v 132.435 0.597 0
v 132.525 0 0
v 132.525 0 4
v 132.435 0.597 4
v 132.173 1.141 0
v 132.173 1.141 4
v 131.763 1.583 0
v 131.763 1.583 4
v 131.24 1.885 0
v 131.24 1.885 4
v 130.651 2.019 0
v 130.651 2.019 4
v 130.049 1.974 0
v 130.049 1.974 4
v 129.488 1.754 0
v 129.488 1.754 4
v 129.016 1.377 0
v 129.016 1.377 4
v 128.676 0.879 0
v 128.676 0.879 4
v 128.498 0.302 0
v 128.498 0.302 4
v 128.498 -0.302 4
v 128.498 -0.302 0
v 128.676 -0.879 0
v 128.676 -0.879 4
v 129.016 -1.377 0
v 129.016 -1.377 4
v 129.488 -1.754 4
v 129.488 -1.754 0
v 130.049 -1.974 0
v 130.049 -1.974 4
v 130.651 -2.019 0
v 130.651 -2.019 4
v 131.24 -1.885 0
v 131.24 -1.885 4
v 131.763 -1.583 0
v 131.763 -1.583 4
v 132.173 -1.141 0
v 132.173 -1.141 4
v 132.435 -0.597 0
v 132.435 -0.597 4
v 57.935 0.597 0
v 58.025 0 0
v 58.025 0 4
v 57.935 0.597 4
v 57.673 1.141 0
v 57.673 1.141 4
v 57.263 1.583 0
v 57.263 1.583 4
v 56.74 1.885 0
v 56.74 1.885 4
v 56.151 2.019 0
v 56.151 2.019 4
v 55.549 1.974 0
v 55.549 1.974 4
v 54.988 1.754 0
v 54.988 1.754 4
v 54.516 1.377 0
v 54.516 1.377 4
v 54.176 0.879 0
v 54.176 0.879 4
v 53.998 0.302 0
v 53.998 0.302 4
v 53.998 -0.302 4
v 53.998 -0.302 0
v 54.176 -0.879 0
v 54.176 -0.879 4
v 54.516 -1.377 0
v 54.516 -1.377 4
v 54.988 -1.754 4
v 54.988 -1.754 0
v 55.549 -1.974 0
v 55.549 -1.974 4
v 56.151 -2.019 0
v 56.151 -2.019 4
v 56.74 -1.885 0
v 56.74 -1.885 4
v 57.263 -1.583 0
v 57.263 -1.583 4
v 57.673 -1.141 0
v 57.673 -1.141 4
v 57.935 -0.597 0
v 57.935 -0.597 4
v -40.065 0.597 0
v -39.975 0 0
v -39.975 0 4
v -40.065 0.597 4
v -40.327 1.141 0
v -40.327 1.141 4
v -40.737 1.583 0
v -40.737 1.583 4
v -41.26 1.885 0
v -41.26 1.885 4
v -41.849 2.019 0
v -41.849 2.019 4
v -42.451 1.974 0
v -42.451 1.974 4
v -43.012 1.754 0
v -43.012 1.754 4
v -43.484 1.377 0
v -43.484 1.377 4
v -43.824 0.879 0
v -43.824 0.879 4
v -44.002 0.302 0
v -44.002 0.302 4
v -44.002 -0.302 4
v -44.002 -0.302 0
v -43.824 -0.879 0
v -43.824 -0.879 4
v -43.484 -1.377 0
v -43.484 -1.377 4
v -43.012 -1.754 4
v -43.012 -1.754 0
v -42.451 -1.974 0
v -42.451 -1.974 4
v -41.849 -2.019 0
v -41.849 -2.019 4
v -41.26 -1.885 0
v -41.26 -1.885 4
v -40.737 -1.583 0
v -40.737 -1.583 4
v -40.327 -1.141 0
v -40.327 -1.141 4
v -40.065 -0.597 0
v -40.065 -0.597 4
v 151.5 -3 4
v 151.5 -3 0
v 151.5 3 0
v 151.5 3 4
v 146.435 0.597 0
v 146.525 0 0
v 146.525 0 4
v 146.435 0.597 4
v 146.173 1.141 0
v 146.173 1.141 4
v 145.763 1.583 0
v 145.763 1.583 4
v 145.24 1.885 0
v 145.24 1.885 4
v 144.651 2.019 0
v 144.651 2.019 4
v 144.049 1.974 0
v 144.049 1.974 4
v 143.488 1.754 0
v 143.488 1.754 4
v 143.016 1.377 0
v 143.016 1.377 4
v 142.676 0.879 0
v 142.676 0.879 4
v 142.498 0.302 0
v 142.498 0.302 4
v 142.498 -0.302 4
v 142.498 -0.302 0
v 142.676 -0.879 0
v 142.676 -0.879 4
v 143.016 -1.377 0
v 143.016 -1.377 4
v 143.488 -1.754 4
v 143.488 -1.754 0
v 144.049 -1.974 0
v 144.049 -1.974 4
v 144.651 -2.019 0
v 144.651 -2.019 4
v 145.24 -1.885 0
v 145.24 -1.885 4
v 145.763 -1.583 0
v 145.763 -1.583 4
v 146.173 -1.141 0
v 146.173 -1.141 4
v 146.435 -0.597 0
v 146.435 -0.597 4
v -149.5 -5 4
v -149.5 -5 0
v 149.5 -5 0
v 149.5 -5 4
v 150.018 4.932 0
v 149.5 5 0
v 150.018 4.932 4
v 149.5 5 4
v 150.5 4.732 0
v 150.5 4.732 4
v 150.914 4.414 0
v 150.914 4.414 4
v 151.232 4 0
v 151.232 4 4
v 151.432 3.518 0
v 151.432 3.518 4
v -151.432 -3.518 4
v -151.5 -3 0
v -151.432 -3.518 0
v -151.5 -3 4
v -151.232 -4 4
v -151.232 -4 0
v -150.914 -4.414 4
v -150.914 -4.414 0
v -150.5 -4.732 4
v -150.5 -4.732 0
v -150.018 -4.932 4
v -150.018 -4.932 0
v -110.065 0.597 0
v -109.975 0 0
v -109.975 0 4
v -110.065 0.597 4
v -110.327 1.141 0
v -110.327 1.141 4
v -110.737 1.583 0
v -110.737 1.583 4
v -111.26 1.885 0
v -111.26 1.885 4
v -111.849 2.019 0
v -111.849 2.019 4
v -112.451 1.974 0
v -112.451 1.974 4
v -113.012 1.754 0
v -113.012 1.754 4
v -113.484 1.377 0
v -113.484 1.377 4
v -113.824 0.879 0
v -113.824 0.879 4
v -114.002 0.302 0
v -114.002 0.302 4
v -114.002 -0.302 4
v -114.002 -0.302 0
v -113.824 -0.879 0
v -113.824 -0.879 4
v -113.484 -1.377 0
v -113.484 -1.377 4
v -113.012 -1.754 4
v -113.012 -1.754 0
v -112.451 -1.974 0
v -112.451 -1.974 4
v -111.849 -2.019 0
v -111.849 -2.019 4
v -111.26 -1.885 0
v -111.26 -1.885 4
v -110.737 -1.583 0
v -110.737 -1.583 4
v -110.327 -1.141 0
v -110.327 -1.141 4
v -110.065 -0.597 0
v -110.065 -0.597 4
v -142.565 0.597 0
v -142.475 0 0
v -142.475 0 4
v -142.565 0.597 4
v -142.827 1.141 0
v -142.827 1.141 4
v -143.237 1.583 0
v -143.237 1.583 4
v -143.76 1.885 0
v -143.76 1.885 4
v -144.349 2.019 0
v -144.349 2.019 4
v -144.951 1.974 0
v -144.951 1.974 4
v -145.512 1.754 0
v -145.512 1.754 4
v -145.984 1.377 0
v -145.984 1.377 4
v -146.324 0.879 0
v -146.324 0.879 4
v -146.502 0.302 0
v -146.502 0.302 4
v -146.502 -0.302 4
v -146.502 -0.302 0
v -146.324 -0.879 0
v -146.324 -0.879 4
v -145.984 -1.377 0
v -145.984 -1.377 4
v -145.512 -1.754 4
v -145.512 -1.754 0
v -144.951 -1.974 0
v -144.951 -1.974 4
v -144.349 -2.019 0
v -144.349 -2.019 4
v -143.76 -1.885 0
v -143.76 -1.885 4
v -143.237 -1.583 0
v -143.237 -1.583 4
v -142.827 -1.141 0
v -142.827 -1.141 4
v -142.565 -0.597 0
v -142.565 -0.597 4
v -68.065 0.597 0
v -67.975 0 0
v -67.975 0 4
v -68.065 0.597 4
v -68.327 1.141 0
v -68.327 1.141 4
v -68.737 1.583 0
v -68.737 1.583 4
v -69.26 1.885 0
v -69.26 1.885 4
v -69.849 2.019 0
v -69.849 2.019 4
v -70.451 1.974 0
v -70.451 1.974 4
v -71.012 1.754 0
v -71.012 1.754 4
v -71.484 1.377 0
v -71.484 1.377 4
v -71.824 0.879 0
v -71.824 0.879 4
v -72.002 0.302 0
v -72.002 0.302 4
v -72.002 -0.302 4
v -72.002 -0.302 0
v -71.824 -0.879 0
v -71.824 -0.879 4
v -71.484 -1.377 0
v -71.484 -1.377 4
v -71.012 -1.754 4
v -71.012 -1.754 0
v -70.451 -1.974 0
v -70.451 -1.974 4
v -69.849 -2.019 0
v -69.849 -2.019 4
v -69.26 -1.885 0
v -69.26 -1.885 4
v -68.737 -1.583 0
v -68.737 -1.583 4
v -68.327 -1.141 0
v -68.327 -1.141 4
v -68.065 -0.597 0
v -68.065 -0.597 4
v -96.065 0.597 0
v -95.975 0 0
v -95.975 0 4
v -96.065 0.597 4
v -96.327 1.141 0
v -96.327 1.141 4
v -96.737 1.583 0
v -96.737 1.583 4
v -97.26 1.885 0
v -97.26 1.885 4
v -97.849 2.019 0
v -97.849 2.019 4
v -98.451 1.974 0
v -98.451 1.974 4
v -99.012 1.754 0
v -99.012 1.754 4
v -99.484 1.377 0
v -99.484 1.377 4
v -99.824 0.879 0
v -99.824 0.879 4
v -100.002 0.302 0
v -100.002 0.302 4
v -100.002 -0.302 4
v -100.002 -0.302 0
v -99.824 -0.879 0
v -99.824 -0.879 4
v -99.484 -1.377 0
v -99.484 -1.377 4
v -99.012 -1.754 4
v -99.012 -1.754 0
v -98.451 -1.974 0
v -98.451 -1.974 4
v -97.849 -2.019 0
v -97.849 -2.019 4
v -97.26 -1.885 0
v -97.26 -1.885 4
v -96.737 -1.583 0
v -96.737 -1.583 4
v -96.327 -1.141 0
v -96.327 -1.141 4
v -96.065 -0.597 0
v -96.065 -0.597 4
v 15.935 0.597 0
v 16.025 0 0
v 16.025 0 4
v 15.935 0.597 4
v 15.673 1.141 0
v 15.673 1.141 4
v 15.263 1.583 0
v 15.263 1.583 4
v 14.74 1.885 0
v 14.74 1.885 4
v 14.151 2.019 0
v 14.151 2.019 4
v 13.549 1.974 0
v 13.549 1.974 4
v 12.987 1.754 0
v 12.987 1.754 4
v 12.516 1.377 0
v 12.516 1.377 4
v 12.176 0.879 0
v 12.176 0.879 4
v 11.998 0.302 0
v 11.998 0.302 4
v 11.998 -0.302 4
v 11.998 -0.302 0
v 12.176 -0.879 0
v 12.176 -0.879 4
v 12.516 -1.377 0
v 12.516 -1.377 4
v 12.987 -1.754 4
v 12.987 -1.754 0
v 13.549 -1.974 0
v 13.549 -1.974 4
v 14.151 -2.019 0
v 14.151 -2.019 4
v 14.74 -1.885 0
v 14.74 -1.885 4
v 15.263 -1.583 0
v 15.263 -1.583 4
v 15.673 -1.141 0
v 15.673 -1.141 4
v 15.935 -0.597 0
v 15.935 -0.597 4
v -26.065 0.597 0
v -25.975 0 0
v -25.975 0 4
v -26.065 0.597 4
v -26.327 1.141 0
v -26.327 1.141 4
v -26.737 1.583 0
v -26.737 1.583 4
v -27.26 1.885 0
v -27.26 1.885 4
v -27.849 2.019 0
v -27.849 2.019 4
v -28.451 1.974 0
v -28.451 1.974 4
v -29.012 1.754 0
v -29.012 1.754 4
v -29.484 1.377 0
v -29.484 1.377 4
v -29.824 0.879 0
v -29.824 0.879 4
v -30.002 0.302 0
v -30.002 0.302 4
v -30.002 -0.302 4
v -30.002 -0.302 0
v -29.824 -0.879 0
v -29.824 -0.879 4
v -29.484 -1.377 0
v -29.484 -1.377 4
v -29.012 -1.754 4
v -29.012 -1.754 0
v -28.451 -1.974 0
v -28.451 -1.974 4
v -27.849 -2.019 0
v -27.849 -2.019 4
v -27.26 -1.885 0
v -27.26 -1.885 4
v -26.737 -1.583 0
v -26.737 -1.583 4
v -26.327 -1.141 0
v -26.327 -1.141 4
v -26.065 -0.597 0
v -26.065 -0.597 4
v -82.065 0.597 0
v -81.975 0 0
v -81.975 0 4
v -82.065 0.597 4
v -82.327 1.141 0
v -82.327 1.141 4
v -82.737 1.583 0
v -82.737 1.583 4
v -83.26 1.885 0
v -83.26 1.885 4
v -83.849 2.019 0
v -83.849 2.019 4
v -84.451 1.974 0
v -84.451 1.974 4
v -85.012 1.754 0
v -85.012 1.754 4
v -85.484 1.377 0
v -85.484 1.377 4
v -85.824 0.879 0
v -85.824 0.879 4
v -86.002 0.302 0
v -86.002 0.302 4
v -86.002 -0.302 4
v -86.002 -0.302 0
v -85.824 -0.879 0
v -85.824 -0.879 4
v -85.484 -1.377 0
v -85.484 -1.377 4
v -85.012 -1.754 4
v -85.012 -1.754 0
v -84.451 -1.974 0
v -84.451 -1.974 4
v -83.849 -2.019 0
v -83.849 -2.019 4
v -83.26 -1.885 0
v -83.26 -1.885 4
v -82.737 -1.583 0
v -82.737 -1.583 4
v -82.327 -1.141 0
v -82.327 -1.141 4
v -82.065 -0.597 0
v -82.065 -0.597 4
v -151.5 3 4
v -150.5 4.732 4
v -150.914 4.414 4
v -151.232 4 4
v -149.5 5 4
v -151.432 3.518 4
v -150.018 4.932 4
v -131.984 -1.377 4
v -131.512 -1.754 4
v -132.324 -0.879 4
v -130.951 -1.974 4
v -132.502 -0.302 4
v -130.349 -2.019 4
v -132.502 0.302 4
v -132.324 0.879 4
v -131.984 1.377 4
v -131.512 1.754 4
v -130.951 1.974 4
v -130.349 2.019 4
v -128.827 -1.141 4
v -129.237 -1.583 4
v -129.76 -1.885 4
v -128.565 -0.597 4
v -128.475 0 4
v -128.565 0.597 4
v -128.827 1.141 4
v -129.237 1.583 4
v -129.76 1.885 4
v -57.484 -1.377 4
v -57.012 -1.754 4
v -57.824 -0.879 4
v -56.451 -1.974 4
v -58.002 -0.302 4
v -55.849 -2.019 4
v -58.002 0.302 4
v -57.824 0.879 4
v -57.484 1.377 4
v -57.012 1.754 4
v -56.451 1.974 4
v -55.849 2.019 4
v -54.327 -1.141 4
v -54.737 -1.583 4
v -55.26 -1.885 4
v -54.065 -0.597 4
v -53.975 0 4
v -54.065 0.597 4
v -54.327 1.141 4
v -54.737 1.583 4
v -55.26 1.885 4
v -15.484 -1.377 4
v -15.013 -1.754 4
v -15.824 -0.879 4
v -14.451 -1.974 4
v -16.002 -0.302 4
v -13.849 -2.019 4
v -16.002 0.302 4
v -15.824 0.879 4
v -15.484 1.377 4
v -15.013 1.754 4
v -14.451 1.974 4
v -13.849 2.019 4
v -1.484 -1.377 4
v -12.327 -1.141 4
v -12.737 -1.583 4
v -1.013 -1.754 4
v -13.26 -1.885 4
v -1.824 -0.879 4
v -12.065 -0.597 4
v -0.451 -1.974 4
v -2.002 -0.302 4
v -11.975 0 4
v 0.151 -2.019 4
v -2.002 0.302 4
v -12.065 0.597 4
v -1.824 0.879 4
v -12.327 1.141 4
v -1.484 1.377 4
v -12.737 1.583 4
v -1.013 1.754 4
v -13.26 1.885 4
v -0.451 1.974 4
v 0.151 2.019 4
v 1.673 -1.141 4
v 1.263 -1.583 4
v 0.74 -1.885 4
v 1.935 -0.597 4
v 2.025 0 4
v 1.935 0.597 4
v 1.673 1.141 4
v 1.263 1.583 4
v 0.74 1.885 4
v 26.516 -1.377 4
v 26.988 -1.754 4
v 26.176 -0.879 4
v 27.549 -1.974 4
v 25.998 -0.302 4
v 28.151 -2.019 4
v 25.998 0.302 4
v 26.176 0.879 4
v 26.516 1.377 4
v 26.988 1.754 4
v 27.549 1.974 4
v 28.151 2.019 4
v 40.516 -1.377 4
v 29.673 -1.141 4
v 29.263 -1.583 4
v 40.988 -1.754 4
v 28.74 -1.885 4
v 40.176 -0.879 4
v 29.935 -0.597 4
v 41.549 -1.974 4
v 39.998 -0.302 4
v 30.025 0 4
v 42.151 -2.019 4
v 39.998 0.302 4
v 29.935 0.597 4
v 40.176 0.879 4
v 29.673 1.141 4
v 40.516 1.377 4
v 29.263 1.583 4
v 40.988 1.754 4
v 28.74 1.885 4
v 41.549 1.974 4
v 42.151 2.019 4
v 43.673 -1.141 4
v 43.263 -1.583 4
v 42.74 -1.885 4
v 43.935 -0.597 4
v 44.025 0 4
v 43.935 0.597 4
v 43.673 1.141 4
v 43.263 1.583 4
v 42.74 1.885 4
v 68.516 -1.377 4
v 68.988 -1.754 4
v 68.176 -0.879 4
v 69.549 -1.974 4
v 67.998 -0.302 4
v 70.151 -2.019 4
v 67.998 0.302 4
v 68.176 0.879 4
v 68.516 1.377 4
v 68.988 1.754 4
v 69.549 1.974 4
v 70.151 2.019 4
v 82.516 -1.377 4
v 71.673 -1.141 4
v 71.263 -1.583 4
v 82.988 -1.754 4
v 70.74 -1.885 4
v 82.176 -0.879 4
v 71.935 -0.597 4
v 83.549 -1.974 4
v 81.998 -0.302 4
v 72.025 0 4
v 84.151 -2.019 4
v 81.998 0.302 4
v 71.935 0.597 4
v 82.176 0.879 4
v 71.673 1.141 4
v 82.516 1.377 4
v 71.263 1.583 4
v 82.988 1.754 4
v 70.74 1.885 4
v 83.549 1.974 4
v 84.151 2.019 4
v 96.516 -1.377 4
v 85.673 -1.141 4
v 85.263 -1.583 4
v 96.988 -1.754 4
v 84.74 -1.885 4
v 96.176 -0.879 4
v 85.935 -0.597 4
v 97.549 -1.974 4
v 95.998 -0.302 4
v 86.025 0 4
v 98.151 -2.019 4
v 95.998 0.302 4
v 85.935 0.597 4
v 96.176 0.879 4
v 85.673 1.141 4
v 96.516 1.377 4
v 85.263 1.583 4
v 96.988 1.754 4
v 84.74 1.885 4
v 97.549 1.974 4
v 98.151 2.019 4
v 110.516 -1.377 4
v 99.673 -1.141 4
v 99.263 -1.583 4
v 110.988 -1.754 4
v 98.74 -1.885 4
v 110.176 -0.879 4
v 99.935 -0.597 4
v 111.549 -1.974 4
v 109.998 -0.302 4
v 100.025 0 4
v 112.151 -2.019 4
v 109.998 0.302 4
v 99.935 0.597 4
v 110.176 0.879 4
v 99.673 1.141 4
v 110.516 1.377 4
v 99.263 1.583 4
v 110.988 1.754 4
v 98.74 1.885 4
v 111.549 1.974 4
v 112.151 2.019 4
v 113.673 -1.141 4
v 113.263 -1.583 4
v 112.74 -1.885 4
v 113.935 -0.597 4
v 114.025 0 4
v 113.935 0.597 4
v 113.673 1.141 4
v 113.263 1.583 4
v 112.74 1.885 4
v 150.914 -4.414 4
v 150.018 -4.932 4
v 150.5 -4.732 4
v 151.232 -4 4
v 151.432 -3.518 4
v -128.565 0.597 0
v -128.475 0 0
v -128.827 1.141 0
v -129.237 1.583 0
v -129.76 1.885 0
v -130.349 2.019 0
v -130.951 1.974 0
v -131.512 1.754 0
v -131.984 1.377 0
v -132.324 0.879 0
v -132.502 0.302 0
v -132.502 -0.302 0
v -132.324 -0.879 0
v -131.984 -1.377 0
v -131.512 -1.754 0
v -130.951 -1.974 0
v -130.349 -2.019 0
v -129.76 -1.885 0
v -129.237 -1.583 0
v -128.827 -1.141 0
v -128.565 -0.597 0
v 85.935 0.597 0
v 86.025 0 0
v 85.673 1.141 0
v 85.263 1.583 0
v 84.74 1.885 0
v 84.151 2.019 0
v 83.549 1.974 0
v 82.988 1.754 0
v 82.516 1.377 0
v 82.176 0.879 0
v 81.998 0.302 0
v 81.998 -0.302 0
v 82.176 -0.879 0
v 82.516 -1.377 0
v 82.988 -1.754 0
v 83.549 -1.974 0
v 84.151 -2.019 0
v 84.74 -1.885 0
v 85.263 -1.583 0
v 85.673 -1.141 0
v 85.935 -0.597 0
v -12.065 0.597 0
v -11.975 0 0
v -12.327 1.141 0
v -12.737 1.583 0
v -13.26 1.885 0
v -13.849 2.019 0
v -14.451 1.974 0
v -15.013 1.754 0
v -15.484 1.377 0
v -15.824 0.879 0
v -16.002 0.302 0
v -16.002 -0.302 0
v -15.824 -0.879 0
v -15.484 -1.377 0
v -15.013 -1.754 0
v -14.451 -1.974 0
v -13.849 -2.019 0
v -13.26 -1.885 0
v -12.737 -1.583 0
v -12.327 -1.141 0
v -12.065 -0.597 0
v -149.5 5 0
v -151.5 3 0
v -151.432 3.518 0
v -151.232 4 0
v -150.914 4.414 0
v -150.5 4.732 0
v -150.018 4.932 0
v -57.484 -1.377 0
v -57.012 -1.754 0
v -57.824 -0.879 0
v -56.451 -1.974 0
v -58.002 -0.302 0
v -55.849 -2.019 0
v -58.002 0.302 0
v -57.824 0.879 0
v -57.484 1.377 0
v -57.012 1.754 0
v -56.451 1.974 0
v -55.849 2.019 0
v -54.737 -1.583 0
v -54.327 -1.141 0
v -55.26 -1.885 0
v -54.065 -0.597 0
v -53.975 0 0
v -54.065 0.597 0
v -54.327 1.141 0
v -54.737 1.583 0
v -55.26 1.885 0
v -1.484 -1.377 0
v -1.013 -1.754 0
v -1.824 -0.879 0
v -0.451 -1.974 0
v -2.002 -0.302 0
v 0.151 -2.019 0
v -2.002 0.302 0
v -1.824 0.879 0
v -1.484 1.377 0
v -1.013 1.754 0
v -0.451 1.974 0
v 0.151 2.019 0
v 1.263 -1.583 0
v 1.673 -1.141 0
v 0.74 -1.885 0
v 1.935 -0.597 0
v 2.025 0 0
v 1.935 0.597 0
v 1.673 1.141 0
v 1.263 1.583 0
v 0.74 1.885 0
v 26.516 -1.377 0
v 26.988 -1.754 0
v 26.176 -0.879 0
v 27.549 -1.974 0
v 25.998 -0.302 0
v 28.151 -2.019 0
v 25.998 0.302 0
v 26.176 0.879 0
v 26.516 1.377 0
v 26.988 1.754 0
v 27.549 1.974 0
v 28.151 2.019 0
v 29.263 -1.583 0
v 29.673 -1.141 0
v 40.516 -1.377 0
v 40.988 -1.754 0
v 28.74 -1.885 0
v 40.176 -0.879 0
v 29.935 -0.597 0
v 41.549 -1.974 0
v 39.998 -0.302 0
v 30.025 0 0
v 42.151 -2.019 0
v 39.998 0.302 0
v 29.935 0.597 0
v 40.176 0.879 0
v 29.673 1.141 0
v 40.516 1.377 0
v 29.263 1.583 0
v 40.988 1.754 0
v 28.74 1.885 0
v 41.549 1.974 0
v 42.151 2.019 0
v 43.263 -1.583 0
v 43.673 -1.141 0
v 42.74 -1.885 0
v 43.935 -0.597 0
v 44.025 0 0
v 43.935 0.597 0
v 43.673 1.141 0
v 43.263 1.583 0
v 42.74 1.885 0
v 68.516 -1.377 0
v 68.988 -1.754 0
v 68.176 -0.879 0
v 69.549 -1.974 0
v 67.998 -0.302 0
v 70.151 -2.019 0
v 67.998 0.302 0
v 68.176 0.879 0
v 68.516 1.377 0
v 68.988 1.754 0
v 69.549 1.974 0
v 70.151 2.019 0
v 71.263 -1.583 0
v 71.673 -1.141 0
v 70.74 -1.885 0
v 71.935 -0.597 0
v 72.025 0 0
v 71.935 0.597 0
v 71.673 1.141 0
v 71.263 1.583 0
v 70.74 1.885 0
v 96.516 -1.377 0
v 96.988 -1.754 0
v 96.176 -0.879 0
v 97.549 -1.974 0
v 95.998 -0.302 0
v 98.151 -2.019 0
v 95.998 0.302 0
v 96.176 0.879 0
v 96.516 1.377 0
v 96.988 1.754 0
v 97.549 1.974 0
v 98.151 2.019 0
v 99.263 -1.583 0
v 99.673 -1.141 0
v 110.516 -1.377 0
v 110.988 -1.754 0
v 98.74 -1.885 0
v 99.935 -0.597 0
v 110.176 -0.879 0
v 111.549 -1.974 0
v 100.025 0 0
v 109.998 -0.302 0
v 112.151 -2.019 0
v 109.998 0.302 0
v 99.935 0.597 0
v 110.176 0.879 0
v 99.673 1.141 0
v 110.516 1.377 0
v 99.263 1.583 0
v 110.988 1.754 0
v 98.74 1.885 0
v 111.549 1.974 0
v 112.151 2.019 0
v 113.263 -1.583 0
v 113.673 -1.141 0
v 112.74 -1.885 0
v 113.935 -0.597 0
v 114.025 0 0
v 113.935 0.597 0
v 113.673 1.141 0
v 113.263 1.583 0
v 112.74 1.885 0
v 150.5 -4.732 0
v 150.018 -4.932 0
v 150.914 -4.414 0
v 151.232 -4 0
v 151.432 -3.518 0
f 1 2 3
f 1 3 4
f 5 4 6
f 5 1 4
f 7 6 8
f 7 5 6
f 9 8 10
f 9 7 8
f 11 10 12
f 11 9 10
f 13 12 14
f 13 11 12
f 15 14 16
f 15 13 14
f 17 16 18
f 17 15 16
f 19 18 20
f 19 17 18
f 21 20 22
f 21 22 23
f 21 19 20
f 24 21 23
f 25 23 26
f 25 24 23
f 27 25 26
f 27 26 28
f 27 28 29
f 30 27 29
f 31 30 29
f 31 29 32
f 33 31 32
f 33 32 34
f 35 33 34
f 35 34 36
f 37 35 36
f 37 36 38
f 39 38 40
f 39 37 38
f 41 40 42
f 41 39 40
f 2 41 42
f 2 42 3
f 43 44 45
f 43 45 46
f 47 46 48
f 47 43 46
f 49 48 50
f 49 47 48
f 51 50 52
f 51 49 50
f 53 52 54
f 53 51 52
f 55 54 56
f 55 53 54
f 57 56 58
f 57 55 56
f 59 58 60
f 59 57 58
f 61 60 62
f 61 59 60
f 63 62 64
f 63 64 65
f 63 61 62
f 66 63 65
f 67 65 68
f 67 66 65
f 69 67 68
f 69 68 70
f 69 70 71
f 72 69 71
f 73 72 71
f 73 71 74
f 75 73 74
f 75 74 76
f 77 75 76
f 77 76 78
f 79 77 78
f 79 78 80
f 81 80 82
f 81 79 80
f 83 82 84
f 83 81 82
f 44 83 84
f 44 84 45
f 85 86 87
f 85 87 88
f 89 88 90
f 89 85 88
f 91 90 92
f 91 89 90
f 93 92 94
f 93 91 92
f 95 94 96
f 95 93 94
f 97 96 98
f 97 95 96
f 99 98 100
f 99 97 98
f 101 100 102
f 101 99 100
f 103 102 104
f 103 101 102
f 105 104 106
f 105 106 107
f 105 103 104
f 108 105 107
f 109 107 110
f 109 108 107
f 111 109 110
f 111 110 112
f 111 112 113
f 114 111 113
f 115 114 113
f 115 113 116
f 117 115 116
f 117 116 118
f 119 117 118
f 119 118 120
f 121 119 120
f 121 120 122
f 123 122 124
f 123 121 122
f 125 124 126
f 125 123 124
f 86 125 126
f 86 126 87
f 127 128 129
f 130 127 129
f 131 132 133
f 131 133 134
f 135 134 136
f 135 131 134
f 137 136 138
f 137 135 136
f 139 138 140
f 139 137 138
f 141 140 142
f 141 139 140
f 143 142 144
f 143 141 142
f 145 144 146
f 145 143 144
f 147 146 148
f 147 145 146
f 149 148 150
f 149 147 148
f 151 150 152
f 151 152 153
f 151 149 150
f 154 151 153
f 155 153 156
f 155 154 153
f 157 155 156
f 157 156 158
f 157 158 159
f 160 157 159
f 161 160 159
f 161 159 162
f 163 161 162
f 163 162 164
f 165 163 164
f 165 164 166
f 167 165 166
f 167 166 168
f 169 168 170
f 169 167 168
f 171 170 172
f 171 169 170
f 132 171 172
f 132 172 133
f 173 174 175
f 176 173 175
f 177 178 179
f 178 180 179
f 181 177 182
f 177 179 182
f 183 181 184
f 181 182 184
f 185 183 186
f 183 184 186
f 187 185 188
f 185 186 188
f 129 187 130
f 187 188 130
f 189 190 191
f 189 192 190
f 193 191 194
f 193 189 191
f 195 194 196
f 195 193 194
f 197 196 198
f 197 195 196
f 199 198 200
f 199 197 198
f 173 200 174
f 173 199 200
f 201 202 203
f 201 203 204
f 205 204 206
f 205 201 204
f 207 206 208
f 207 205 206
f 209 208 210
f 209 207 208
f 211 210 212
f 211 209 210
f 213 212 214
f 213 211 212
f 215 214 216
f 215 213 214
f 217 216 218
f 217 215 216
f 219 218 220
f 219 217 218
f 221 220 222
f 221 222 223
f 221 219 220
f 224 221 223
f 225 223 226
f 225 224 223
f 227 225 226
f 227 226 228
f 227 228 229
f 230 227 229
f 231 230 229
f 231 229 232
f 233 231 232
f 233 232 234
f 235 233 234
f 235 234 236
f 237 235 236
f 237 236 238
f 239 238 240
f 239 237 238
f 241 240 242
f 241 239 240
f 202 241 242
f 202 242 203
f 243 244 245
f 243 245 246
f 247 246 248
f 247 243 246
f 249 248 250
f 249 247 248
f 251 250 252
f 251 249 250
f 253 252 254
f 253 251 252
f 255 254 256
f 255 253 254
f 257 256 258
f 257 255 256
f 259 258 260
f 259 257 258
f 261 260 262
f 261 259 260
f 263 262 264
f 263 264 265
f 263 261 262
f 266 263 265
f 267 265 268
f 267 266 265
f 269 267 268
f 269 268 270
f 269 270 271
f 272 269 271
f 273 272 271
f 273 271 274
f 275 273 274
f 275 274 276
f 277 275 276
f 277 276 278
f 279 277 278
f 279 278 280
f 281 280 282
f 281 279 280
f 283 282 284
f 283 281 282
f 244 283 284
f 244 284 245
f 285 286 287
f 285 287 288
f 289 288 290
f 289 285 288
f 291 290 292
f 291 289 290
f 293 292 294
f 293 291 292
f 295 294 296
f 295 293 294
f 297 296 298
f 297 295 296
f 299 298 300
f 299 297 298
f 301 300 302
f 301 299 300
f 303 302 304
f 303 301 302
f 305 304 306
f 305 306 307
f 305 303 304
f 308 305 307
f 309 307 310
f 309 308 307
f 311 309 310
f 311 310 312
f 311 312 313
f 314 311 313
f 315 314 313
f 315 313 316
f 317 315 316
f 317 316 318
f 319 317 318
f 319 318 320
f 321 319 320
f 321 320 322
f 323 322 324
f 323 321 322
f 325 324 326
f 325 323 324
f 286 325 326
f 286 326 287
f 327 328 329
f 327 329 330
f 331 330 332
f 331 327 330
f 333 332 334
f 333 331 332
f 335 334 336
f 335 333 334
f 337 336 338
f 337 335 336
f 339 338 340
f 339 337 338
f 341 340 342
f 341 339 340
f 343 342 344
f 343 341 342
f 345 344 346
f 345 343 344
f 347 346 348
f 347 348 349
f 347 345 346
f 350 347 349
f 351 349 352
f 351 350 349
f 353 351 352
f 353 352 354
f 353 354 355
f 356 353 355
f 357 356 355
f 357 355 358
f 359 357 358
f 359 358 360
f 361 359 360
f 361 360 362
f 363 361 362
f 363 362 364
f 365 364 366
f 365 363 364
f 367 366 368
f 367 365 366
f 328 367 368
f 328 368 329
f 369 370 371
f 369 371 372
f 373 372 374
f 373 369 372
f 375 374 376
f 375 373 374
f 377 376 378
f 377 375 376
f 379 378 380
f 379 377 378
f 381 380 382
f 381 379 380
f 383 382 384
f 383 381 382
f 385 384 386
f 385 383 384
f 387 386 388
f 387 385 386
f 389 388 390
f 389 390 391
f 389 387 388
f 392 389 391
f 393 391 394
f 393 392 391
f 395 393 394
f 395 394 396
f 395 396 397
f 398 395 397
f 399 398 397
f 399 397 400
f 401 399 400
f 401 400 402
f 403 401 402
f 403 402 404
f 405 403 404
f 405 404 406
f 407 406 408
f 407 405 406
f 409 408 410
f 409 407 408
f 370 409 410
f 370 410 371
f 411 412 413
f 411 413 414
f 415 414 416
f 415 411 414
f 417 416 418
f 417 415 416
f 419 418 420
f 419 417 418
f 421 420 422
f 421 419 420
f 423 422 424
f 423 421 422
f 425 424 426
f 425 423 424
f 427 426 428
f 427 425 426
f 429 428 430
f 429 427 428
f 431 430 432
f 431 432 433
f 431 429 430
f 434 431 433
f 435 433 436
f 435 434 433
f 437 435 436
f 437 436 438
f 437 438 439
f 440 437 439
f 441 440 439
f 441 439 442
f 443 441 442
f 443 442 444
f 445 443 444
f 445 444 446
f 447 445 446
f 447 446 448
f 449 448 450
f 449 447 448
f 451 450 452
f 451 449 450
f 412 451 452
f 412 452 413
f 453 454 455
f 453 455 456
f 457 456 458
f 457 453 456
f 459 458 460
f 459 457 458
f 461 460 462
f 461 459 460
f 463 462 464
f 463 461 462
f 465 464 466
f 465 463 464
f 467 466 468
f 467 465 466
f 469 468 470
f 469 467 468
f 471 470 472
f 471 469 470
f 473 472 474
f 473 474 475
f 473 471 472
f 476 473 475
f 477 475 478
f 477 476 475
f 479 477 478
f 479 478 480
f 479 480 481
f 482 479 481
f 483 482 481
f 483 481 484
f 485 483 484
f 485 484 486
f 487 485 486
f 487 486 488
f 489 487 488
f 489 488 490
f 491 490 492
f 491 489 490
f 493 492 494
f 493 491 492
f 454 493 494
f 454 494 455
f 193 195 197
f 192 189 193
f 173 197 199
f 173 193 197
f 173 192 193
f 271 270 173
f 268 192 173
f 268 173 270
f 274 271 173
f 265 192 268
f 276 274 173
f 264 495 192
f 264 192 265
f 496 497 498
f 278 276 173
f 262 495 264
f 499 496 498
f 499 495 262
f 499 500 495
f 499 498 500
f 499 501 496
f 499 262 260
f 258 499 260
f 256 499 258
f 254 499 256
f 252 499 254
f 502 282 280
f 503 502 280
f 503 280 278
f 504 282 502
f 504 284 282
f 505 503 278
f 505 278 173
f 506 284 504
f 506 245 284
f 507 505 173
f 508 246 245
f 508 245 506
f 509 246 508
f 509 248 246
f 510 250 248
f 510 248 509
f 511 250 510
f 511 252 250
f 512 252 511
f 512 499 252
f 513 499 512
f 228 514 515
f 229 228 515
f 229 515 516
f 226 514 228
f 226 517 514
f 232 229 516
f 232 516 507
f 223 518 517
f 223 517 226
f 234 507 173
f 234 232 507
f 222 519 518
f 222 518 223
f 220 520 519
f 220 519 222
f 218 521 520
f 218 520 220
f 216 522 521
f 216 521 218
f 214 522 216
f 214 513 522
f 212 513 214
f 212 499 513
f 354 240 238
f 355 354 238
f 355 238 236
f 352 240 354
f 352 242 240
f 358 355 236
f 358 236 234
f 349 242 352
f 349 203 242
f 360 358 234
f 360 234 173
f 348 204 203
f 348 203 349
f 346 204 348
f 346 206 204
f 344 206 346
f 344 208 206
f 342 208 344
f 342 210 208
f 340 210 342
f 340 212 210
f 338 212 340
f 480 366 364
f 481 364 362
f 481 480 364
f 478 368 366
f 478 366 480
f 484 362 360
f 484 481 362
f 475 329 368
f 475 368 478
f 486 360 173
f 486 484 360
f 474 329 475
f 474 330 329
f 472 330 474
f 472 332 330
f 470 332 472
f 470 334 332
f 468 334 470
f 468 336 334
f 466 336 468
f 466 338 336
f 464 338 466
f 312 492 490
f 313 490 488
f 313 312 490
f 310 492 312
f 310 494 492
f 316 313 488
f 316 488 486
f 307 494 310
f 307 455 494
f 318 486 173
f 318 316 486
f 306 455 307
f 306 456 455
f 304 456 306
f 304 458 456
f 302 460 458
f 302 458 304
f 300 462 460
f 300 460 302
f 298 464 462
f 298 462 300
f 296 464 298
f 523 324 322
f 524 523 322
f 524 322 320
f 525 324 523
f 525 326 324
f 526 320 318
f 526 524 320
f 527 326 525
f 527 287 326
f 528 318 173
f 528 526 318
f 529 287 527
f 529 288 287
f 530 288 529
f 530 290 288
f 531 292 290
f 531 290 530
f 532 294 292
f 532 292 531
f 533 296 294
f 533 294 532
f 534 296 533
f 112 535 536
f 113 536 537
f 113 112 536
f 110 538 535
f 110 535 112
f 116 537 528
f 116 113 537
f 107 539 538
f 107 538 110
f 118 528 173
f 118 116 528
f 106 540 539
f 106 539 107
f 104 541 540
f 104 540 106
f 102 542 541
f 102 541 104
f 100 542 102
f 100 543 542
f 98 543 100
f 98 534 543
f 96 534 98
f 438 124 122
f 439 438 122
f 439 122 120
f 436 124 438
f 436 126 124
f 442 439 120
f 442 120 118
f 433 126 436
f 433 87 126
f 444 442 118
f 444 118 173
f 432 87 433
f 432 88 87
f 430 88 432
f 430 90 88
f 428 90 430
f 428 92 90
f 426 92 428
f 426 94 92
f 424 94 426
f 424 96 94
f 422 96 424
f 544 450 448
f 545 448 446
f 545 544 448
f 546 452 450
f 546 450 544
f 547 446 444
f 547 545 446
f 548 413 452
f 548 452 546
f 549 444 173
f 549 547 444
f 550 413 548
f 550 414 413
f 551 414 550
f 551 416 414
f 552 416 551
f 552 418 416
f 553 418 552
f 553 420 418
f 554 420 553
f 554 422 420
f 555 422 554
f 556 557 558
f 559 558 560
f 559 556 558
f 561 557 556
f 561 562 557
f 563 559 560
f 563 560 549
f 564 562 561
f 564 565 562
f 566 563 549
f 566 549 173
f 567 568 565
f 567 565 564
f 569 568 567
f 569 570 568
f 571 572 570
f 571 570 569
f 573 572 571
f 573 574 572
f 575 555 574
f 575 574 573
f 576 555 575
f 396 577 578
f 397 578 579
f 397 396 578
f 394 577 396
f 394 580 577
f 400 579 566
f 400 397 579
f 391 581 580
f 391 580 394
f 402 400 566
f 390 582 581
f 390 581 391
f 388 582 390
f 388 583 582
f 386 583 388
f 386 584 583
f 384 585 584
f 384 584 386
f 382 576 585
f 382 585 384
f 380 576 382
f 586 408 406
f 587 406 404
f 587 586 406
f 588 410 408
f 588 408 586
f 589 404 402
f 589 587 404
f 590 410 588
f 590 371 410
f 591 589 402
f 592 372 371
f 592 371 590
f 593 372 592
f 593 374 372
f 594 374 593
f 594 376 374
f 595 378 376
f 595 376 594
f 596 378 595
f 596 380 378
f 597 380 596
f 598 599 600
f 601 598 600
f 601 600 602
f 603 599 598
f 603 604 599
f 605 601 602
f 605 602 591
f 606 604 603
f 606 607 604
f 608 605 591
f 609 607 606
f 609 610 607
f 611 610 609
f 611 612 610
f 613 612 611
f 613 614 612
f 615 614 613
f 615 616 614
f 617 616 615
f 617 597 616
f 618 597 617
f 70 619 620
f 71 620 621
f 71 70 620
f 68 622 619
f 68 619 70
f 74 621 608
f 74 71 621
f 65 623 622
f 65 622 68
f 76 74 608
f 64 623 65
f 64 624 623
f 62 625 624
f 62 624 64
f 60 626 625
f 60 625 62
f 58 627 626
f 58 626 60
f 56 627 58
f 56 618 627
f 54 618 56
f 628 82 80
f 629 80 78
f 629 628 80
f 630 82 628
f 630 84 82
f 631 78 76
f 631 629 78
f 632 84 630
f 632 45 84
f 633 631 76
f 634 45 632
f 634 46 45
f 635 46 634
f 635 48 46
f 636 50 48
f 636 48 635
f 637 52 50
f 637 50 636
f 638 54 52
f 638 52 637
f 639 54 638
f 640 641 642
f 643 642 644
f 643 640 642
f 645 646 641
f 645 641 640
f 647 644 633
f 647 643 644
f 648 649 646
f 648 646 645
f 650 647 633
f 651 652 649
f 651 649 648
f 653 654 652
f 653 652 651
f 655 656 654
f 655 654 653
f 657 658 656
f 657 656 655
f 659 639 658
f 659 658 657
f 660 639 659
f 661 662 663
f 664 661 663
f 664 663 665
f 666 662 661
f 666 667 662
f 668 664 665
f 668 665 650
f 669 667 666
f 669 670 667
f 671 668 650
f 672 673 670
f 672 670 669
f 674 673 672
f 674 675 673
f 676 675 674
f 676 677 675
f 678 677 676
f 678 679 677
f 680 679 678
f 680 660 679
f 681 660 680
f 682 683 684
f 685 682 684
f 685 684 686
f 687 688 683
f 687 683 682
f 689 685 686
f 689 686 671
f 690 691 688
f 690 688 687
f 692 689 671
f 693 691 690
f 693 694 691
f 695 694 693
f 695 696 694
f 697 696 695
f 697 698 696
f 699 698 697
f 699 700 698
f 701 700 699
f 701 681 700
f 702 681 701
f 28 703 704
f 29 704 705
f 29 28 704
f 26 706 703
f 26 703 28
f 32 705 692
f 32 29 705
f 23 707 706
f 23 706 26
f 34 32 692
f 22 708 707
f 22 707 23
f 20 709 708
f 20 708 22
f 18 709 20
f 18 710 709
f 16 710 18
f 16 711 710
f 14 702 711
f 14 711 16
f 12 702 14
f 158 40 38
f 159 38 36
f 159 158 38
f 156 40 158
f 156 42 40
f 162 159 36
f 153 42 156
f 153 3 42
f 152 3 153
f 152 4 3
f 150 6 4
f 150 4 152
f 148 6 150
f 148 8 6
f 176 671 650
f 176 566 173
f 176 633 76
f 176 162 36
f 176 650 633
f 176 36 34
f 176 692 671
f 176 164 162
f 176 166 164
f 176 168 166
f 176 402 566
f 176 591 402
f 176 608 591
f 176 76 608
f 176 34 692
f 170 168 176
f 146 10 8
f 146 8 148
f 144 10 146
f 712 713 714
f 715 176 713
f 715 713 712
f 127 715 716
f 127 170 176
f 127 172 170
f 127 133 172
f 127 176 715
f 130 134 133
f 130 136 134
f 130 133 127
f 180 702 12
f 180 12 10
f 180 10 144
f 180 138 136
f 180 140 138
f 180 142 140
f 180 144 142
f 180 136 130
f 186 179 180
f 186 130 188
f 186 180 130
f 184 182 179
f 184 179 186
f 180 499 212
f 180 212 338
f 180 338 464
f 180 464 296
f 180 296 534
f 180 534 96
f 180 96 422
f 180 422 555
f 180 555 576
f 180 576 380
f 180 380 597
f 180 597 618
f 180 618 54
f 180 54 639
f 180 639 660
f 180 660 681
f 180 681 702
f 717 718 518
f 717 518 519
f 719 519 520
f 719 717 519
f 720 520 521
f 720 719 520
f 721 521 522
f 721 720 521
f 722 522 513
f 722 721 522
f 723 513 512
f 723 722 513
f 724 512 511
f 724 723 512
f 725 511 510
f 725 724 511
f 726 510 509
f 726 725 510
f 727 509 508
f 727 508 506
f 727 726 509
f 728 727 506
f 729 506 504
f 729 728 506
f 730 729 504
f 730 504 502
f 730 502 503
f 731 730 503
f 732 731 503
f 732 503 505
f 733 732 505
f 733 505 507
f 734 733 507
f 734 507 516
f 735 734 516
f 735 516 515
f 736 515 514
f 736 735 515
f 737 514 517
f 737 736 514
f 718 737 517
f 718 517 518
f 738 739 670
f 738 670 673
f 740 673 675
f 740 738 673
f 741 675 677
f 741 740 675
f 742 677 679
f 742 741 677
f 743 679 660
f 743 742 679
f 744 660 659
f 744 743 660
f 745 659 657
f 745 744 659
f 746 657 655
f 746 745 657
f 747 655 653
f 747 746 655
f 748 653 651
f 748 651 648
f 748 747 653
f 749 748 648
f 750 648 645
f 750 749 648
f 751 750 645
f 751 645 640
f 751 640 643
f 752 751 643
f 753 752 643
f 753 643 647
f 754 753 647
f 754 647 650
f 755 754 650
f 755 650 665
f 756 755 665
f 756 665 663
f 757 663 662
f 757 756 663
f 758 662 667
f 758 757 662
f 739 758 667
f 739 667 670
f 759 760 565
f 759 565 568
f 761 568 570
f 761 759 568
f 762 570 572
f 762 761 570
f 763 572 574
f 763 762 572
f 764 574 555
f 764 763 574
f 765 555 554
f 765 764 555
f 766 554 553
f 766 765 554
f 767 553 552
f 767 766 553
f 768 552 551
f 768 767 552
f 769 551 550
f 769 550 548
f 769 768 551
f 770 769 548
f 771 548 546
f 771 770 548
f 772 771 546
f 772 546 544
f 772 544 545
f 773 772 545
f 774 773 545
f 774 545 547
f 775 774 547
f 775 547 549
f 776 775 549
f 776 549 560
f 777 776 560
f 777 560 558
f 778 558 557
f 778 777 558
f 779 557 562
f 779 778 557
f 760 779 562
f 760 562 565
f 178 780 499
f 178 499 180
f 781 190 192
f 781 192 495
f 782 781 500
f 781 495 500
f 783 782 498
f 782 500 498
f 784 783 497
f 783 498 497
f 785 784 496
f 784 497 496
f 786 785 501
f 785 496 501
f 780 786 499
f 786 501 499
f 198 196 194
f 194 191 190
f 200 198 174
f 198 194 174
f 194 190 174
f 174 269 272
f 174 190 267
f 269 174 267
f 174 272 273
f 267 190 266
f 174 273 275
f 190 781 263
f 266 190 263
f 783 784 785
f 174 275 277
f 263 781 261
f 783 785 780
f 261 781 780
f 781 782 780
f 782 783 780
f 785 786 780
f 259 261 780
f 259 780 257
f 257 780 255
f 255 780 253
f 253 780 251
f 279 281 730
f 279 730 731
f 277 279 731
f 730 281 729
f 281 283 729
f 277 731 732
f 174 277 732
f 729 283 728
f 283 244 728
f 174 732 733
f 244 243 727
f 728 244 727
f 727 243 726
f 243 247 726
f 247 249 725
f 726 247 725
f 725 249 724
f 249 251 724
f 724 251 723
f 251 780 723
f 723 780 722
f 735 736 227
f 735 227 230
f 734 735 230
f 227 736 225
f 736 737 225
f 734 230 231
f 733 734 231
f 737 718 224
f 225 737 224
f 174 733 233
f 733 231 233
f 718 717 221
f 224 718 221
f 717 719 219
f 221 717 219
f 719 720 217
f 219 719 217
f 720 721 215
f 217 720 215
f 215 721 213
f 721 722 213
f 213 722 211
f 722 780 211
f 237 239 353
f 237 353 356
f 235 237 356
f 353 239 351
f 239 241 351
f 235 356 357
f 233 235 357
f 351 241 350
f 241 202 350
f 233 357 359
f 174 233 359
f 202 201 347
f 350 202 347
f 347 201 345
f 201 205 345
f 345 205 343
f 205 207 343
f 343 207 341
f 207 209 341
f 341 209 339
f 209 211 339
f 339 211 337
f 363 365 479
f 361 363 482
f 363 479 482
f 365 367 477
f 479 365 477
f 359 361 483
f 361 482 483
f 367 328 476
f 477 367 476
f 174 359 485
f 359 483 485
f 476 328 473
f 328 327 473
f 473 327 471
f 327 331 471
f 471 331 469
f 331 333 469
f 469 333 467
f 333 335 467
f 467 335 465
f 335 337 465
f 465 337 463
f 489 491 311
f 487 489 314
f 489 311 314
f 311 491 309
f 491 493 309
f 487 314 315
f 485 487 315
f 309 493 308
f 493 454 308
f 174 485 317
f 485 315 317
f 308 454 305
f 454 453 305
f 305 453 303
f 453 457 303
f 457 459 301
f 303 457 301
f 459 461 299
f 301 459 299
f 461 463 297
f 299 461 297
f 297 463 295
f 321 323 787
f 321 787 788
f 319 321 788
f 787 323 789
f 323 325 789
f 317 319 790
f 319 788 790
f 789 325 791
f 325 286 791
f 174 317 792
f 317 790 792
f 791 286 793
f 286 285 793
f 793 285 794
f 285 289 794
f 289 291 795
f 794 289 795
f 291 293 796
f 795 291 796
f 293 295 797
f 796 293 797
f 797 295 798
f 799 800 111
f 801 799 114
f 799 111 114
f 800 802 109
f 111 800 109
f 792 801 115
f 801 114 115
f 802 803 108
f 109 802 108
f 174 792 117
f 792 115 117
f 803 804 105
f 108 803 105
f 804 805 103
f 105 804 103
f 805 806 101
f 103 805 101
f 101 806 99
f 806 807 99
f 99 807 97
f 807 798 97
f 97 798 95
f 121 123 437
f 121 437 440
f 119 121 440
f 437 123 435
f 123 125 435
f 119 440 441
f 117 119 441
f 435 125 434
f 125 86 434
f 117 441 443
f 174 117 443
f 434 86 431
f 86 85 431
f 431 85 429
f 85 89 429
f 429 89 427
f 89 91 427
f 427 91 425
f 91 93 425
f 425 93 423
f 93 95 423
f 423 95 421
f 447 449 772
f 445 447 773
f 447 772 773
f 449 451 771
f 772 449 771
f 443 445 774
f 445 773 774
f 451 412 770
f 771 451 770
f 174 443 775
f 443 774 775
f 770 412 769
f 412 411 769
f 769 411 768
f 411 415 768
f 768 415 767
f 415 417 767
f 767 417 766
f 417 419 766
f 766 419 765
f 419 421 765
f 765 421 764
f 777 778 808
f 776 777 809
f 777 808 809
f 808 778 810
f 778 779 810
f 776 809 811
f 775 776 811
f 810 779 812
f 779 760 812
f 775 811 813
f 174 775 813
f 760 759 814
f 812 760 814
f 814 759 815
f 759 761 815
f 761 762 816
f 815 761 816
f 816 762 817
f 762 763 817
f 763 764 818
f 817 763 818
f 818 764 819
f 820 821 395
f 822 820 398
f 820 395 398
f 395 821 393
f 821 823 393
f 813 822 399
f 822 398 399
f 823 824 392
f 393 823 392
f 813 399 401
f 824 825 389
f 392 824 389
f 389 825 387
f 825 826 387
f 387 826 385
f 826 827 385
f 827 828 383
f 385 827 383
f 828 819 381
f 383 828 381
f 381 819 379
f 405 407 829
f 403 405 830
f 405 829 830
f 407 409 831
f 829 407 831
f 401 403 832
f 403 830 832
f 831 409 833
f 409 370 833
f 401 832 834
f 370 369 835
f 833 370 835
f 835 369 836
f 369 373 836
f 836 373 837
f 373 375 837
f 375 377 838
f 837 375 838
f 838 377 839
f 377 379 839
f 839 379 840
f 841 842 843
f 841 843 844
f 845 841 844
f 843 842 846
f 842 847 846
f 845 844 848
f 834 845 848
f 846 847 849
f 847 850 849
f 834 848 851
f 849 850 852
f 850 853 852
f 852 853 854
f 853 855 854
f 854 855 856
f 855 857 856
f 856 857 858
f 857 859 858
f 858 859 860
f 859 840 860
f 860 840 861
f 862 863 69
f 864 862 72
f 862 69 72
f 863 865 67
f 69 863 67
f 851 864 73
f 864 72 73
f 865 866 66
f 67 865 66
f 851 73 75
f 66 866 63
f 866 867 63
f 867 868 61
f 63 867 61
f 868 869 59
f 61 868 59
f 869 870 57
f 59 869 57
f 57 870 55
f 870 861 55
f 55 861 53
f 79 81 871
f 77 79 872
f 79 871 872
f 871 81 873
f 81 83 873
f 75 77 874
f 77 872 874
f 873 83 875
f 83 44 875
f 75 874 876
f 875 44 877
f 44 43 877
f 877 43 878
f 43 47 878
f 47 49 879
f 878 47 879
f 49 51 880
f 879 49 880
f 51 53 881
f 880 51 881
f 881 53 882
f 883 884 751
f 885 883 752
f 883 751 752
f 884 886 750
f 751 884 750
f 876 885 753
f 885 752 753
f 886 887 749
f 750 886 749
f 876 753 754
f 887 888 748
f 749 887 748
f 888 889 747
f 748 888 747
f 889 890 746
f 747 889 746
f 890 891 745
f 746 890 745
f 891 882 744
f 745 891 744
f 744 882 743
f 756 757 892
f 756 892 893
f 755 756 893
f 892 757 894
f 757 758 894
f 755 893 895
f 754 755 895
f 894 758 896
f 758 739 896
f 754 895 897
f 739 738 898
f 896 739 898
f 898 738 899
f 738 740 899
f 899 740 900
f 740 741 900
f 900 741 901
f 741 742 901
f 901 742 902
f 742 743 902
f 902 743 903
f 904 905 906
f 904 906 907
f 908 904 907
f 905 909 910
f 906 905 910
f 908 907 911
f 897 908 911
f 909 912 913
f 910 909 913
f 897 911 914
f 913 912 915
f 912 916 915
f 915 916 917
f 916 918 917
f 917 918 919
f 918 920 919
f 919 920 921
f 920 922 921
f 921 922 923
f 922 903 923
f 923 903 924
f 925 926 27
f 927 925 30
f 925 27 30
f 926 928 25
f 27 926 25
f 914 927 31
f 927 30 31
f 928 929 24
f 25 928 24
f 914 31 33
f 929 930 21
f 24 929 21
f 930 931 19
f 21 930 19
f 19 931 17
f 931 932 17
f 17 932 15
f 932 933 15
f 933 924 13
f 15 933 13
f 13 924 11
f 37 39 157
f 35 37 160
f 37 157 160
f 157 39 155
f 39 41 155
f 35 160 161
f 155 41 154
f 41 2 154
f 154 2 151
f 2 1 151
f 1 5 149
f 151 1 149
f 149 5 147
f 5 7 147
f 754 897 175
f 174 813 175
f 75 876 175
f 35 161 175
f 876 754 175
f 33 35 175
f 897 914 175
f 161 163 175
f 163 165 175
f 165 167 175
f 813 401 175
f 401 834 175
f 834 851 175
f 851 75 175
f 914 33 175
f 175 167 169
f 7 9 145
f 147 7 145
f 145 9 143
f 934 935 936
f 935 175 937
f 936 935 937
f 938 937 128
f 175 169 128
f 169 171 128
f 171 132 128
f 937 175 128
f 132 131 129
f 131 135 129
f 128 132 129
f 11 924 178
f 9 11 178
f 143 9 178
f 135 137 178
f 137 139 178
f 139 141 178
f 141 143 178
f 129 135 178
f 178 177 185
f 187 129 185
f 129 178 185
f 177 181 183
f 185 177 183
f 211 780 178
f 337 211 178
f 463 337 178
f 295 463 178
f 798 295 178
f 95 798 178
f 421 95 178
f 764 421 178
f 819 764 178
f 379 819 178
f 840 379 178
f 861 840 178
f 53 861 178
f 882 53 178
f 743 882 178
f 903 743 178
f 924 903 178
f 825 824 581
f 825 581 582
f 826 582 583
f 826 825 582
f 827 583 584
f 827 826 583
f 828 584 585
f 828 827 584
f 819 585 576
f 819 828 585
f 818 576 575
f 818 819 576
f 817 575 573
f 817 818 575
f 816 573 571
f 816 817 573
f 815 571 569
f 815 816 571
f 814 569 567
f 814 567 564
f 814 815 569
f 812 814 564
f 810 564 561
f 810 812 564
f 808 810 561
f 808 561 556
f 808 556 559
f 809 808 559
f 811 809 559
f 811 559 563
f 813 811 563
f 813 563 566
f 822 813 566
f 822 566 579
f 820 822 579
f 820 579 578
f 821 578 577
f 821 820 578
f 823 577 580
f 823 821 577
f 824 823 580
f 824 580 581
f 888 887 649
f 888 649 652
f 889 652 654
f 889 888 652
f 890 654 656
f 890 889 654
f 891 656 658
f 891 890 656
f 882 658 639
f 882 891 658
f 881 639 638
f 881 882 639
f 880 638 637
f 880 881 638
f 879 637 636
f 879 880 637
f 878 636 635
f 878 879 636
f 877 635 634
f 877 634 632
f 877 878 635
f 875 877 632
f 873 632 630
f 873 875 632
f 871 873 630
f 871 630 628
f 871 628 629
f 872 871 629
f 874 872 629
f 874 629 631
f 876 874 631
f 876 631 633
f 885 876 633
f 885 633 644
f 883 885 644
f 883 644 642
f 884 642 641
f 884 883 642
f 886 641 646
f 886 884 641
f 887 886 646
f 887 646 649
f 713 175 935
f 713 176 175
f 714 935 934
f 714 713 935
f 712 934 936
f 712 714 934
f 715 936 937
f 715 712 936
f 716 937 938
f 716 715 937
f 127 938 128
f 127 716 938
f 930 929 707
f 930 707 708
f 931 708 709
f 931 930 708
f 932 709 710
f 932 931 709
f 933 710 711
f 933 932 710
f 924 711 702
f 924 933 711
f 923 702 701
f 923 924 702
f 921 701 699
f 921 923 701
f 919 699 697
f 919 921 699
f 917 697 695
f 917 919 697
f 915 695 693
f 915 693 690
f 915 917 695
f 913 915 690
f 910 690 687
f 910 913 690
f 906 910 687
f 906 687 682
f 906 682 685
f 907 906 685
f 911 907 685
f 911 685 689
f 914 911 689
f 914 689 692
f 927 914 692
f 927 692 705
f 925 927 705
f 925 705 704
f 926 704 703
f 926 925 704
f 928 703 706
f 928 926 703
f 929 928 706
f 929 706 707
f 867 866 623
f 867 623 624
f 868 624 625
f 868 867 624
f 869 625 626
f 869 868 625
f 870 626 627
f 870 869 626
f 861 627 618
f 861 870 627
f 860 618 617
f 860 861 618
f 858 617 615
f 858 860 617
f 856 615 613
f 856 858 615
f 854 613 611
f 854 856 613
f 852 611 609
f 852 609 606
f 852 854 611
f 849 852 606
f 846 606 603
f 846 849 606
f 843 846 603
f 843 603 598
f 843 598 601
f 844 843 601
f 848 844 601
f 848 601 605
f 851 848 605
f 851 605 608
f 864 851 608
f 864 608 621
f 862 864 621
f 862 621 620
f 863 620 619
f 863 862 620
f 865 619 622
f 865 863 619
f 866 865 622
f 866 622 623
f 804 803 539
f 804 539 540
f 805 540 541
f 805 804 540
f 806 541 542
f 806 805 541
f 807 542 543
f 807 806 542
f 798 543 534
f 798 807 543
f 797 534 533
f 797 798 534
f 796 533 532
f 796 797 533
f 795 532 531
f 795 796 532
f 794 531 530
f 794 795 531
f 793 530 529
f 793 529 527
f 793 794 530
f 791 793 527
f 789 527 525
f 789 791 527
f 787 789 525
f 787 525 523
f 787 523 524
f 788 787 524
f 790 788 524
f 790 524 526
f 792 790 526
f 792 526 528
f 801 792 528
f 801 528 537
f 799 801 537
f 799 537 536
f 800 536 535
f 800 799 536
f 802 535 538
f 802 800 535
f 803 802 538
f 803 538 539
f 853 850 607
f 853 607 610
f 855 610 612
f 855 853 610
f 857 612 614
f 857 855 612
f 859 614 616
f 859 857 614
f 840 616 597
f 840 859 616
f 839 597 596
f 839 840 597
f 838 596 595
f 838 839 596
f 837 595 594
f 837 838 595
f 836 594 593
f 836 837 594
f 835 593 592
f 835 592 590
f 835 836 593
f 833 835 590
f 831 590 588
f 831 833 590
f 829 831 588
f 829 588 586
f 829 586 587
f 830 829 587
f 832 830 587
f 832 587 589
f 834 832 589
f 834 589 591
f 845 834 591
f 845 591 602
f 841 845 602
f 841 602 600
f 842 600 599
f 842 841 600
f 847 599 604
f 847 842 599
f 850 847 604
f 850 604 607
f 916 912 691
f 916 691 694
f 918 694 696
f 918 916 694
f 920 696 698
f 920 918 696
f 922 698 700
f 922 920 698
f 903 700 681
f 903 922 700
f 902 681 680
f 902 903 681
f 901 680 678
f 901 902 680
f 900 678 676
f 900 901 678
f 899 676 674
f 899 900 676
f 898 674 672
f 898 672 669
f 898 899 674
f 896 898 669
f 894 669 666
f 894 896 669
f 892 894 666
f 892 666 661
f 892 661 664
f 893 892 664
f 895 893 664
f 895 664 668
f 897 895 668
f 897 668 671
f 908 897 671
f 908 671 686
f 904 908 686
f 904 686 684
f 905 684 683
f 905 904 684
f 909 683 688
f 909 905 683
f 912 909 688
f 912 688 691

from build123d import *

# Parameters (mm, degrees)
SKETCH_1_W      = 303
SKETCH_1_H      = 10
SKETCH_1_R      = 2.025
EXTRUDE_1_DEPTH = 4
FILLET_1_R      = 2


with BuildPart() as part:
    # 草图1 → 凸台-拉伸1 (new body)
    with BuildSketch(Plane.XY):
        Rectangle(SKETCH_1_W, SKETCH_1_H)
        with Locations((-112, 0)):
            Circle(SKETCH_1_R, mode=Mode.SUBTRACT)
        with Locations((-98, 0)):
            Circle(SKETCH_1_R, mode=Mode.SUBTRACT)
        with Locations((-84, 0)):
            Circle(SKETCH_1_R, mode=Mode.SUBTRACT)
        with Locations((-70, 0)):
            Circle(SKETCH_1_R, mode=Mode.SUBTRACT)
        with Locations((-56, 0)):
            Circle(SKETCH_1_R, mode=Mode.SUBTRACT)
        with Locations((-42, 0)):
            Circle(SKETCH_1_R, mode=Mode.SUBTRACT)
        with Locations((-28, 0)):
            Circle(SKETCH_1_R, mode=Mode.SUBTRACT)
        with Locations((-14, 0)):
            Circle(SKETCH_1_R, mode=Mode.SUBTRACT)
        Circle(SKETCH_1_R, mode=Mode.SUBTRACT)
        with Locations((14, 0)):
            Circle(SKETCH_1_R, mode=Mode.SUBTRACT)
        with Locations((28, 0)):
            Circle(SKETCH_1_R, mode=Mode.SUBTRACT)
        with Locations((42, 0)):
            Circle(SKETCH_1_R, mode=Mode.SUBTRACT)
        with Locations((56, 0)):
            Circle(SKETCH_1_R, mode=Mode.SUBTRACT)
        with Locations((70, 0)):
            Circle(SKETCH_1_R, mode=Mode.SUBTRACT)
        with Locations((84, 0)):
            Circle(SKETCH_1_R, mode=Mode.SUBTRACT)
        with Locations((98, 0)):
            Circle(SKETCH_1_R, mode=Mode.SUBTRACT)
        with Locations((112, 0)):
            Circle(SKETCH_1_R, mode=Mode.SUBTRACT)
        with Locations((-144.5, 0)):
            Circle(SKETCH_1_R, mode=Mode.SUBTRACT)
        with Locations((-130.5, 0)):
            Circle(SKETCH_1_R, mode=Mode.SUBTRACT)
        with Locations((130.5, 0)):
            Circle(SKETCH_1_R, mode=Mode.SUBTRACT)
        with Locations((144.5, 0)):
            Circle(SKETCH_1_R, mode=Mode.SUBTRACT)
    extrude(amount=EXTRUDE_1_DEPTH)

    # 圆角1
    fillet_1_edges = [part.edges().sort_by_distance(p)[0] for p in [
        (151.5, -5, 2),
        (-151.5, -5, 2),
        (-151.5, 5, 2),
        (151.5, 5, 2),
    ]]
    fillet(fillet_1_edges, radius=FILLET_1_R)


solid = part.part
